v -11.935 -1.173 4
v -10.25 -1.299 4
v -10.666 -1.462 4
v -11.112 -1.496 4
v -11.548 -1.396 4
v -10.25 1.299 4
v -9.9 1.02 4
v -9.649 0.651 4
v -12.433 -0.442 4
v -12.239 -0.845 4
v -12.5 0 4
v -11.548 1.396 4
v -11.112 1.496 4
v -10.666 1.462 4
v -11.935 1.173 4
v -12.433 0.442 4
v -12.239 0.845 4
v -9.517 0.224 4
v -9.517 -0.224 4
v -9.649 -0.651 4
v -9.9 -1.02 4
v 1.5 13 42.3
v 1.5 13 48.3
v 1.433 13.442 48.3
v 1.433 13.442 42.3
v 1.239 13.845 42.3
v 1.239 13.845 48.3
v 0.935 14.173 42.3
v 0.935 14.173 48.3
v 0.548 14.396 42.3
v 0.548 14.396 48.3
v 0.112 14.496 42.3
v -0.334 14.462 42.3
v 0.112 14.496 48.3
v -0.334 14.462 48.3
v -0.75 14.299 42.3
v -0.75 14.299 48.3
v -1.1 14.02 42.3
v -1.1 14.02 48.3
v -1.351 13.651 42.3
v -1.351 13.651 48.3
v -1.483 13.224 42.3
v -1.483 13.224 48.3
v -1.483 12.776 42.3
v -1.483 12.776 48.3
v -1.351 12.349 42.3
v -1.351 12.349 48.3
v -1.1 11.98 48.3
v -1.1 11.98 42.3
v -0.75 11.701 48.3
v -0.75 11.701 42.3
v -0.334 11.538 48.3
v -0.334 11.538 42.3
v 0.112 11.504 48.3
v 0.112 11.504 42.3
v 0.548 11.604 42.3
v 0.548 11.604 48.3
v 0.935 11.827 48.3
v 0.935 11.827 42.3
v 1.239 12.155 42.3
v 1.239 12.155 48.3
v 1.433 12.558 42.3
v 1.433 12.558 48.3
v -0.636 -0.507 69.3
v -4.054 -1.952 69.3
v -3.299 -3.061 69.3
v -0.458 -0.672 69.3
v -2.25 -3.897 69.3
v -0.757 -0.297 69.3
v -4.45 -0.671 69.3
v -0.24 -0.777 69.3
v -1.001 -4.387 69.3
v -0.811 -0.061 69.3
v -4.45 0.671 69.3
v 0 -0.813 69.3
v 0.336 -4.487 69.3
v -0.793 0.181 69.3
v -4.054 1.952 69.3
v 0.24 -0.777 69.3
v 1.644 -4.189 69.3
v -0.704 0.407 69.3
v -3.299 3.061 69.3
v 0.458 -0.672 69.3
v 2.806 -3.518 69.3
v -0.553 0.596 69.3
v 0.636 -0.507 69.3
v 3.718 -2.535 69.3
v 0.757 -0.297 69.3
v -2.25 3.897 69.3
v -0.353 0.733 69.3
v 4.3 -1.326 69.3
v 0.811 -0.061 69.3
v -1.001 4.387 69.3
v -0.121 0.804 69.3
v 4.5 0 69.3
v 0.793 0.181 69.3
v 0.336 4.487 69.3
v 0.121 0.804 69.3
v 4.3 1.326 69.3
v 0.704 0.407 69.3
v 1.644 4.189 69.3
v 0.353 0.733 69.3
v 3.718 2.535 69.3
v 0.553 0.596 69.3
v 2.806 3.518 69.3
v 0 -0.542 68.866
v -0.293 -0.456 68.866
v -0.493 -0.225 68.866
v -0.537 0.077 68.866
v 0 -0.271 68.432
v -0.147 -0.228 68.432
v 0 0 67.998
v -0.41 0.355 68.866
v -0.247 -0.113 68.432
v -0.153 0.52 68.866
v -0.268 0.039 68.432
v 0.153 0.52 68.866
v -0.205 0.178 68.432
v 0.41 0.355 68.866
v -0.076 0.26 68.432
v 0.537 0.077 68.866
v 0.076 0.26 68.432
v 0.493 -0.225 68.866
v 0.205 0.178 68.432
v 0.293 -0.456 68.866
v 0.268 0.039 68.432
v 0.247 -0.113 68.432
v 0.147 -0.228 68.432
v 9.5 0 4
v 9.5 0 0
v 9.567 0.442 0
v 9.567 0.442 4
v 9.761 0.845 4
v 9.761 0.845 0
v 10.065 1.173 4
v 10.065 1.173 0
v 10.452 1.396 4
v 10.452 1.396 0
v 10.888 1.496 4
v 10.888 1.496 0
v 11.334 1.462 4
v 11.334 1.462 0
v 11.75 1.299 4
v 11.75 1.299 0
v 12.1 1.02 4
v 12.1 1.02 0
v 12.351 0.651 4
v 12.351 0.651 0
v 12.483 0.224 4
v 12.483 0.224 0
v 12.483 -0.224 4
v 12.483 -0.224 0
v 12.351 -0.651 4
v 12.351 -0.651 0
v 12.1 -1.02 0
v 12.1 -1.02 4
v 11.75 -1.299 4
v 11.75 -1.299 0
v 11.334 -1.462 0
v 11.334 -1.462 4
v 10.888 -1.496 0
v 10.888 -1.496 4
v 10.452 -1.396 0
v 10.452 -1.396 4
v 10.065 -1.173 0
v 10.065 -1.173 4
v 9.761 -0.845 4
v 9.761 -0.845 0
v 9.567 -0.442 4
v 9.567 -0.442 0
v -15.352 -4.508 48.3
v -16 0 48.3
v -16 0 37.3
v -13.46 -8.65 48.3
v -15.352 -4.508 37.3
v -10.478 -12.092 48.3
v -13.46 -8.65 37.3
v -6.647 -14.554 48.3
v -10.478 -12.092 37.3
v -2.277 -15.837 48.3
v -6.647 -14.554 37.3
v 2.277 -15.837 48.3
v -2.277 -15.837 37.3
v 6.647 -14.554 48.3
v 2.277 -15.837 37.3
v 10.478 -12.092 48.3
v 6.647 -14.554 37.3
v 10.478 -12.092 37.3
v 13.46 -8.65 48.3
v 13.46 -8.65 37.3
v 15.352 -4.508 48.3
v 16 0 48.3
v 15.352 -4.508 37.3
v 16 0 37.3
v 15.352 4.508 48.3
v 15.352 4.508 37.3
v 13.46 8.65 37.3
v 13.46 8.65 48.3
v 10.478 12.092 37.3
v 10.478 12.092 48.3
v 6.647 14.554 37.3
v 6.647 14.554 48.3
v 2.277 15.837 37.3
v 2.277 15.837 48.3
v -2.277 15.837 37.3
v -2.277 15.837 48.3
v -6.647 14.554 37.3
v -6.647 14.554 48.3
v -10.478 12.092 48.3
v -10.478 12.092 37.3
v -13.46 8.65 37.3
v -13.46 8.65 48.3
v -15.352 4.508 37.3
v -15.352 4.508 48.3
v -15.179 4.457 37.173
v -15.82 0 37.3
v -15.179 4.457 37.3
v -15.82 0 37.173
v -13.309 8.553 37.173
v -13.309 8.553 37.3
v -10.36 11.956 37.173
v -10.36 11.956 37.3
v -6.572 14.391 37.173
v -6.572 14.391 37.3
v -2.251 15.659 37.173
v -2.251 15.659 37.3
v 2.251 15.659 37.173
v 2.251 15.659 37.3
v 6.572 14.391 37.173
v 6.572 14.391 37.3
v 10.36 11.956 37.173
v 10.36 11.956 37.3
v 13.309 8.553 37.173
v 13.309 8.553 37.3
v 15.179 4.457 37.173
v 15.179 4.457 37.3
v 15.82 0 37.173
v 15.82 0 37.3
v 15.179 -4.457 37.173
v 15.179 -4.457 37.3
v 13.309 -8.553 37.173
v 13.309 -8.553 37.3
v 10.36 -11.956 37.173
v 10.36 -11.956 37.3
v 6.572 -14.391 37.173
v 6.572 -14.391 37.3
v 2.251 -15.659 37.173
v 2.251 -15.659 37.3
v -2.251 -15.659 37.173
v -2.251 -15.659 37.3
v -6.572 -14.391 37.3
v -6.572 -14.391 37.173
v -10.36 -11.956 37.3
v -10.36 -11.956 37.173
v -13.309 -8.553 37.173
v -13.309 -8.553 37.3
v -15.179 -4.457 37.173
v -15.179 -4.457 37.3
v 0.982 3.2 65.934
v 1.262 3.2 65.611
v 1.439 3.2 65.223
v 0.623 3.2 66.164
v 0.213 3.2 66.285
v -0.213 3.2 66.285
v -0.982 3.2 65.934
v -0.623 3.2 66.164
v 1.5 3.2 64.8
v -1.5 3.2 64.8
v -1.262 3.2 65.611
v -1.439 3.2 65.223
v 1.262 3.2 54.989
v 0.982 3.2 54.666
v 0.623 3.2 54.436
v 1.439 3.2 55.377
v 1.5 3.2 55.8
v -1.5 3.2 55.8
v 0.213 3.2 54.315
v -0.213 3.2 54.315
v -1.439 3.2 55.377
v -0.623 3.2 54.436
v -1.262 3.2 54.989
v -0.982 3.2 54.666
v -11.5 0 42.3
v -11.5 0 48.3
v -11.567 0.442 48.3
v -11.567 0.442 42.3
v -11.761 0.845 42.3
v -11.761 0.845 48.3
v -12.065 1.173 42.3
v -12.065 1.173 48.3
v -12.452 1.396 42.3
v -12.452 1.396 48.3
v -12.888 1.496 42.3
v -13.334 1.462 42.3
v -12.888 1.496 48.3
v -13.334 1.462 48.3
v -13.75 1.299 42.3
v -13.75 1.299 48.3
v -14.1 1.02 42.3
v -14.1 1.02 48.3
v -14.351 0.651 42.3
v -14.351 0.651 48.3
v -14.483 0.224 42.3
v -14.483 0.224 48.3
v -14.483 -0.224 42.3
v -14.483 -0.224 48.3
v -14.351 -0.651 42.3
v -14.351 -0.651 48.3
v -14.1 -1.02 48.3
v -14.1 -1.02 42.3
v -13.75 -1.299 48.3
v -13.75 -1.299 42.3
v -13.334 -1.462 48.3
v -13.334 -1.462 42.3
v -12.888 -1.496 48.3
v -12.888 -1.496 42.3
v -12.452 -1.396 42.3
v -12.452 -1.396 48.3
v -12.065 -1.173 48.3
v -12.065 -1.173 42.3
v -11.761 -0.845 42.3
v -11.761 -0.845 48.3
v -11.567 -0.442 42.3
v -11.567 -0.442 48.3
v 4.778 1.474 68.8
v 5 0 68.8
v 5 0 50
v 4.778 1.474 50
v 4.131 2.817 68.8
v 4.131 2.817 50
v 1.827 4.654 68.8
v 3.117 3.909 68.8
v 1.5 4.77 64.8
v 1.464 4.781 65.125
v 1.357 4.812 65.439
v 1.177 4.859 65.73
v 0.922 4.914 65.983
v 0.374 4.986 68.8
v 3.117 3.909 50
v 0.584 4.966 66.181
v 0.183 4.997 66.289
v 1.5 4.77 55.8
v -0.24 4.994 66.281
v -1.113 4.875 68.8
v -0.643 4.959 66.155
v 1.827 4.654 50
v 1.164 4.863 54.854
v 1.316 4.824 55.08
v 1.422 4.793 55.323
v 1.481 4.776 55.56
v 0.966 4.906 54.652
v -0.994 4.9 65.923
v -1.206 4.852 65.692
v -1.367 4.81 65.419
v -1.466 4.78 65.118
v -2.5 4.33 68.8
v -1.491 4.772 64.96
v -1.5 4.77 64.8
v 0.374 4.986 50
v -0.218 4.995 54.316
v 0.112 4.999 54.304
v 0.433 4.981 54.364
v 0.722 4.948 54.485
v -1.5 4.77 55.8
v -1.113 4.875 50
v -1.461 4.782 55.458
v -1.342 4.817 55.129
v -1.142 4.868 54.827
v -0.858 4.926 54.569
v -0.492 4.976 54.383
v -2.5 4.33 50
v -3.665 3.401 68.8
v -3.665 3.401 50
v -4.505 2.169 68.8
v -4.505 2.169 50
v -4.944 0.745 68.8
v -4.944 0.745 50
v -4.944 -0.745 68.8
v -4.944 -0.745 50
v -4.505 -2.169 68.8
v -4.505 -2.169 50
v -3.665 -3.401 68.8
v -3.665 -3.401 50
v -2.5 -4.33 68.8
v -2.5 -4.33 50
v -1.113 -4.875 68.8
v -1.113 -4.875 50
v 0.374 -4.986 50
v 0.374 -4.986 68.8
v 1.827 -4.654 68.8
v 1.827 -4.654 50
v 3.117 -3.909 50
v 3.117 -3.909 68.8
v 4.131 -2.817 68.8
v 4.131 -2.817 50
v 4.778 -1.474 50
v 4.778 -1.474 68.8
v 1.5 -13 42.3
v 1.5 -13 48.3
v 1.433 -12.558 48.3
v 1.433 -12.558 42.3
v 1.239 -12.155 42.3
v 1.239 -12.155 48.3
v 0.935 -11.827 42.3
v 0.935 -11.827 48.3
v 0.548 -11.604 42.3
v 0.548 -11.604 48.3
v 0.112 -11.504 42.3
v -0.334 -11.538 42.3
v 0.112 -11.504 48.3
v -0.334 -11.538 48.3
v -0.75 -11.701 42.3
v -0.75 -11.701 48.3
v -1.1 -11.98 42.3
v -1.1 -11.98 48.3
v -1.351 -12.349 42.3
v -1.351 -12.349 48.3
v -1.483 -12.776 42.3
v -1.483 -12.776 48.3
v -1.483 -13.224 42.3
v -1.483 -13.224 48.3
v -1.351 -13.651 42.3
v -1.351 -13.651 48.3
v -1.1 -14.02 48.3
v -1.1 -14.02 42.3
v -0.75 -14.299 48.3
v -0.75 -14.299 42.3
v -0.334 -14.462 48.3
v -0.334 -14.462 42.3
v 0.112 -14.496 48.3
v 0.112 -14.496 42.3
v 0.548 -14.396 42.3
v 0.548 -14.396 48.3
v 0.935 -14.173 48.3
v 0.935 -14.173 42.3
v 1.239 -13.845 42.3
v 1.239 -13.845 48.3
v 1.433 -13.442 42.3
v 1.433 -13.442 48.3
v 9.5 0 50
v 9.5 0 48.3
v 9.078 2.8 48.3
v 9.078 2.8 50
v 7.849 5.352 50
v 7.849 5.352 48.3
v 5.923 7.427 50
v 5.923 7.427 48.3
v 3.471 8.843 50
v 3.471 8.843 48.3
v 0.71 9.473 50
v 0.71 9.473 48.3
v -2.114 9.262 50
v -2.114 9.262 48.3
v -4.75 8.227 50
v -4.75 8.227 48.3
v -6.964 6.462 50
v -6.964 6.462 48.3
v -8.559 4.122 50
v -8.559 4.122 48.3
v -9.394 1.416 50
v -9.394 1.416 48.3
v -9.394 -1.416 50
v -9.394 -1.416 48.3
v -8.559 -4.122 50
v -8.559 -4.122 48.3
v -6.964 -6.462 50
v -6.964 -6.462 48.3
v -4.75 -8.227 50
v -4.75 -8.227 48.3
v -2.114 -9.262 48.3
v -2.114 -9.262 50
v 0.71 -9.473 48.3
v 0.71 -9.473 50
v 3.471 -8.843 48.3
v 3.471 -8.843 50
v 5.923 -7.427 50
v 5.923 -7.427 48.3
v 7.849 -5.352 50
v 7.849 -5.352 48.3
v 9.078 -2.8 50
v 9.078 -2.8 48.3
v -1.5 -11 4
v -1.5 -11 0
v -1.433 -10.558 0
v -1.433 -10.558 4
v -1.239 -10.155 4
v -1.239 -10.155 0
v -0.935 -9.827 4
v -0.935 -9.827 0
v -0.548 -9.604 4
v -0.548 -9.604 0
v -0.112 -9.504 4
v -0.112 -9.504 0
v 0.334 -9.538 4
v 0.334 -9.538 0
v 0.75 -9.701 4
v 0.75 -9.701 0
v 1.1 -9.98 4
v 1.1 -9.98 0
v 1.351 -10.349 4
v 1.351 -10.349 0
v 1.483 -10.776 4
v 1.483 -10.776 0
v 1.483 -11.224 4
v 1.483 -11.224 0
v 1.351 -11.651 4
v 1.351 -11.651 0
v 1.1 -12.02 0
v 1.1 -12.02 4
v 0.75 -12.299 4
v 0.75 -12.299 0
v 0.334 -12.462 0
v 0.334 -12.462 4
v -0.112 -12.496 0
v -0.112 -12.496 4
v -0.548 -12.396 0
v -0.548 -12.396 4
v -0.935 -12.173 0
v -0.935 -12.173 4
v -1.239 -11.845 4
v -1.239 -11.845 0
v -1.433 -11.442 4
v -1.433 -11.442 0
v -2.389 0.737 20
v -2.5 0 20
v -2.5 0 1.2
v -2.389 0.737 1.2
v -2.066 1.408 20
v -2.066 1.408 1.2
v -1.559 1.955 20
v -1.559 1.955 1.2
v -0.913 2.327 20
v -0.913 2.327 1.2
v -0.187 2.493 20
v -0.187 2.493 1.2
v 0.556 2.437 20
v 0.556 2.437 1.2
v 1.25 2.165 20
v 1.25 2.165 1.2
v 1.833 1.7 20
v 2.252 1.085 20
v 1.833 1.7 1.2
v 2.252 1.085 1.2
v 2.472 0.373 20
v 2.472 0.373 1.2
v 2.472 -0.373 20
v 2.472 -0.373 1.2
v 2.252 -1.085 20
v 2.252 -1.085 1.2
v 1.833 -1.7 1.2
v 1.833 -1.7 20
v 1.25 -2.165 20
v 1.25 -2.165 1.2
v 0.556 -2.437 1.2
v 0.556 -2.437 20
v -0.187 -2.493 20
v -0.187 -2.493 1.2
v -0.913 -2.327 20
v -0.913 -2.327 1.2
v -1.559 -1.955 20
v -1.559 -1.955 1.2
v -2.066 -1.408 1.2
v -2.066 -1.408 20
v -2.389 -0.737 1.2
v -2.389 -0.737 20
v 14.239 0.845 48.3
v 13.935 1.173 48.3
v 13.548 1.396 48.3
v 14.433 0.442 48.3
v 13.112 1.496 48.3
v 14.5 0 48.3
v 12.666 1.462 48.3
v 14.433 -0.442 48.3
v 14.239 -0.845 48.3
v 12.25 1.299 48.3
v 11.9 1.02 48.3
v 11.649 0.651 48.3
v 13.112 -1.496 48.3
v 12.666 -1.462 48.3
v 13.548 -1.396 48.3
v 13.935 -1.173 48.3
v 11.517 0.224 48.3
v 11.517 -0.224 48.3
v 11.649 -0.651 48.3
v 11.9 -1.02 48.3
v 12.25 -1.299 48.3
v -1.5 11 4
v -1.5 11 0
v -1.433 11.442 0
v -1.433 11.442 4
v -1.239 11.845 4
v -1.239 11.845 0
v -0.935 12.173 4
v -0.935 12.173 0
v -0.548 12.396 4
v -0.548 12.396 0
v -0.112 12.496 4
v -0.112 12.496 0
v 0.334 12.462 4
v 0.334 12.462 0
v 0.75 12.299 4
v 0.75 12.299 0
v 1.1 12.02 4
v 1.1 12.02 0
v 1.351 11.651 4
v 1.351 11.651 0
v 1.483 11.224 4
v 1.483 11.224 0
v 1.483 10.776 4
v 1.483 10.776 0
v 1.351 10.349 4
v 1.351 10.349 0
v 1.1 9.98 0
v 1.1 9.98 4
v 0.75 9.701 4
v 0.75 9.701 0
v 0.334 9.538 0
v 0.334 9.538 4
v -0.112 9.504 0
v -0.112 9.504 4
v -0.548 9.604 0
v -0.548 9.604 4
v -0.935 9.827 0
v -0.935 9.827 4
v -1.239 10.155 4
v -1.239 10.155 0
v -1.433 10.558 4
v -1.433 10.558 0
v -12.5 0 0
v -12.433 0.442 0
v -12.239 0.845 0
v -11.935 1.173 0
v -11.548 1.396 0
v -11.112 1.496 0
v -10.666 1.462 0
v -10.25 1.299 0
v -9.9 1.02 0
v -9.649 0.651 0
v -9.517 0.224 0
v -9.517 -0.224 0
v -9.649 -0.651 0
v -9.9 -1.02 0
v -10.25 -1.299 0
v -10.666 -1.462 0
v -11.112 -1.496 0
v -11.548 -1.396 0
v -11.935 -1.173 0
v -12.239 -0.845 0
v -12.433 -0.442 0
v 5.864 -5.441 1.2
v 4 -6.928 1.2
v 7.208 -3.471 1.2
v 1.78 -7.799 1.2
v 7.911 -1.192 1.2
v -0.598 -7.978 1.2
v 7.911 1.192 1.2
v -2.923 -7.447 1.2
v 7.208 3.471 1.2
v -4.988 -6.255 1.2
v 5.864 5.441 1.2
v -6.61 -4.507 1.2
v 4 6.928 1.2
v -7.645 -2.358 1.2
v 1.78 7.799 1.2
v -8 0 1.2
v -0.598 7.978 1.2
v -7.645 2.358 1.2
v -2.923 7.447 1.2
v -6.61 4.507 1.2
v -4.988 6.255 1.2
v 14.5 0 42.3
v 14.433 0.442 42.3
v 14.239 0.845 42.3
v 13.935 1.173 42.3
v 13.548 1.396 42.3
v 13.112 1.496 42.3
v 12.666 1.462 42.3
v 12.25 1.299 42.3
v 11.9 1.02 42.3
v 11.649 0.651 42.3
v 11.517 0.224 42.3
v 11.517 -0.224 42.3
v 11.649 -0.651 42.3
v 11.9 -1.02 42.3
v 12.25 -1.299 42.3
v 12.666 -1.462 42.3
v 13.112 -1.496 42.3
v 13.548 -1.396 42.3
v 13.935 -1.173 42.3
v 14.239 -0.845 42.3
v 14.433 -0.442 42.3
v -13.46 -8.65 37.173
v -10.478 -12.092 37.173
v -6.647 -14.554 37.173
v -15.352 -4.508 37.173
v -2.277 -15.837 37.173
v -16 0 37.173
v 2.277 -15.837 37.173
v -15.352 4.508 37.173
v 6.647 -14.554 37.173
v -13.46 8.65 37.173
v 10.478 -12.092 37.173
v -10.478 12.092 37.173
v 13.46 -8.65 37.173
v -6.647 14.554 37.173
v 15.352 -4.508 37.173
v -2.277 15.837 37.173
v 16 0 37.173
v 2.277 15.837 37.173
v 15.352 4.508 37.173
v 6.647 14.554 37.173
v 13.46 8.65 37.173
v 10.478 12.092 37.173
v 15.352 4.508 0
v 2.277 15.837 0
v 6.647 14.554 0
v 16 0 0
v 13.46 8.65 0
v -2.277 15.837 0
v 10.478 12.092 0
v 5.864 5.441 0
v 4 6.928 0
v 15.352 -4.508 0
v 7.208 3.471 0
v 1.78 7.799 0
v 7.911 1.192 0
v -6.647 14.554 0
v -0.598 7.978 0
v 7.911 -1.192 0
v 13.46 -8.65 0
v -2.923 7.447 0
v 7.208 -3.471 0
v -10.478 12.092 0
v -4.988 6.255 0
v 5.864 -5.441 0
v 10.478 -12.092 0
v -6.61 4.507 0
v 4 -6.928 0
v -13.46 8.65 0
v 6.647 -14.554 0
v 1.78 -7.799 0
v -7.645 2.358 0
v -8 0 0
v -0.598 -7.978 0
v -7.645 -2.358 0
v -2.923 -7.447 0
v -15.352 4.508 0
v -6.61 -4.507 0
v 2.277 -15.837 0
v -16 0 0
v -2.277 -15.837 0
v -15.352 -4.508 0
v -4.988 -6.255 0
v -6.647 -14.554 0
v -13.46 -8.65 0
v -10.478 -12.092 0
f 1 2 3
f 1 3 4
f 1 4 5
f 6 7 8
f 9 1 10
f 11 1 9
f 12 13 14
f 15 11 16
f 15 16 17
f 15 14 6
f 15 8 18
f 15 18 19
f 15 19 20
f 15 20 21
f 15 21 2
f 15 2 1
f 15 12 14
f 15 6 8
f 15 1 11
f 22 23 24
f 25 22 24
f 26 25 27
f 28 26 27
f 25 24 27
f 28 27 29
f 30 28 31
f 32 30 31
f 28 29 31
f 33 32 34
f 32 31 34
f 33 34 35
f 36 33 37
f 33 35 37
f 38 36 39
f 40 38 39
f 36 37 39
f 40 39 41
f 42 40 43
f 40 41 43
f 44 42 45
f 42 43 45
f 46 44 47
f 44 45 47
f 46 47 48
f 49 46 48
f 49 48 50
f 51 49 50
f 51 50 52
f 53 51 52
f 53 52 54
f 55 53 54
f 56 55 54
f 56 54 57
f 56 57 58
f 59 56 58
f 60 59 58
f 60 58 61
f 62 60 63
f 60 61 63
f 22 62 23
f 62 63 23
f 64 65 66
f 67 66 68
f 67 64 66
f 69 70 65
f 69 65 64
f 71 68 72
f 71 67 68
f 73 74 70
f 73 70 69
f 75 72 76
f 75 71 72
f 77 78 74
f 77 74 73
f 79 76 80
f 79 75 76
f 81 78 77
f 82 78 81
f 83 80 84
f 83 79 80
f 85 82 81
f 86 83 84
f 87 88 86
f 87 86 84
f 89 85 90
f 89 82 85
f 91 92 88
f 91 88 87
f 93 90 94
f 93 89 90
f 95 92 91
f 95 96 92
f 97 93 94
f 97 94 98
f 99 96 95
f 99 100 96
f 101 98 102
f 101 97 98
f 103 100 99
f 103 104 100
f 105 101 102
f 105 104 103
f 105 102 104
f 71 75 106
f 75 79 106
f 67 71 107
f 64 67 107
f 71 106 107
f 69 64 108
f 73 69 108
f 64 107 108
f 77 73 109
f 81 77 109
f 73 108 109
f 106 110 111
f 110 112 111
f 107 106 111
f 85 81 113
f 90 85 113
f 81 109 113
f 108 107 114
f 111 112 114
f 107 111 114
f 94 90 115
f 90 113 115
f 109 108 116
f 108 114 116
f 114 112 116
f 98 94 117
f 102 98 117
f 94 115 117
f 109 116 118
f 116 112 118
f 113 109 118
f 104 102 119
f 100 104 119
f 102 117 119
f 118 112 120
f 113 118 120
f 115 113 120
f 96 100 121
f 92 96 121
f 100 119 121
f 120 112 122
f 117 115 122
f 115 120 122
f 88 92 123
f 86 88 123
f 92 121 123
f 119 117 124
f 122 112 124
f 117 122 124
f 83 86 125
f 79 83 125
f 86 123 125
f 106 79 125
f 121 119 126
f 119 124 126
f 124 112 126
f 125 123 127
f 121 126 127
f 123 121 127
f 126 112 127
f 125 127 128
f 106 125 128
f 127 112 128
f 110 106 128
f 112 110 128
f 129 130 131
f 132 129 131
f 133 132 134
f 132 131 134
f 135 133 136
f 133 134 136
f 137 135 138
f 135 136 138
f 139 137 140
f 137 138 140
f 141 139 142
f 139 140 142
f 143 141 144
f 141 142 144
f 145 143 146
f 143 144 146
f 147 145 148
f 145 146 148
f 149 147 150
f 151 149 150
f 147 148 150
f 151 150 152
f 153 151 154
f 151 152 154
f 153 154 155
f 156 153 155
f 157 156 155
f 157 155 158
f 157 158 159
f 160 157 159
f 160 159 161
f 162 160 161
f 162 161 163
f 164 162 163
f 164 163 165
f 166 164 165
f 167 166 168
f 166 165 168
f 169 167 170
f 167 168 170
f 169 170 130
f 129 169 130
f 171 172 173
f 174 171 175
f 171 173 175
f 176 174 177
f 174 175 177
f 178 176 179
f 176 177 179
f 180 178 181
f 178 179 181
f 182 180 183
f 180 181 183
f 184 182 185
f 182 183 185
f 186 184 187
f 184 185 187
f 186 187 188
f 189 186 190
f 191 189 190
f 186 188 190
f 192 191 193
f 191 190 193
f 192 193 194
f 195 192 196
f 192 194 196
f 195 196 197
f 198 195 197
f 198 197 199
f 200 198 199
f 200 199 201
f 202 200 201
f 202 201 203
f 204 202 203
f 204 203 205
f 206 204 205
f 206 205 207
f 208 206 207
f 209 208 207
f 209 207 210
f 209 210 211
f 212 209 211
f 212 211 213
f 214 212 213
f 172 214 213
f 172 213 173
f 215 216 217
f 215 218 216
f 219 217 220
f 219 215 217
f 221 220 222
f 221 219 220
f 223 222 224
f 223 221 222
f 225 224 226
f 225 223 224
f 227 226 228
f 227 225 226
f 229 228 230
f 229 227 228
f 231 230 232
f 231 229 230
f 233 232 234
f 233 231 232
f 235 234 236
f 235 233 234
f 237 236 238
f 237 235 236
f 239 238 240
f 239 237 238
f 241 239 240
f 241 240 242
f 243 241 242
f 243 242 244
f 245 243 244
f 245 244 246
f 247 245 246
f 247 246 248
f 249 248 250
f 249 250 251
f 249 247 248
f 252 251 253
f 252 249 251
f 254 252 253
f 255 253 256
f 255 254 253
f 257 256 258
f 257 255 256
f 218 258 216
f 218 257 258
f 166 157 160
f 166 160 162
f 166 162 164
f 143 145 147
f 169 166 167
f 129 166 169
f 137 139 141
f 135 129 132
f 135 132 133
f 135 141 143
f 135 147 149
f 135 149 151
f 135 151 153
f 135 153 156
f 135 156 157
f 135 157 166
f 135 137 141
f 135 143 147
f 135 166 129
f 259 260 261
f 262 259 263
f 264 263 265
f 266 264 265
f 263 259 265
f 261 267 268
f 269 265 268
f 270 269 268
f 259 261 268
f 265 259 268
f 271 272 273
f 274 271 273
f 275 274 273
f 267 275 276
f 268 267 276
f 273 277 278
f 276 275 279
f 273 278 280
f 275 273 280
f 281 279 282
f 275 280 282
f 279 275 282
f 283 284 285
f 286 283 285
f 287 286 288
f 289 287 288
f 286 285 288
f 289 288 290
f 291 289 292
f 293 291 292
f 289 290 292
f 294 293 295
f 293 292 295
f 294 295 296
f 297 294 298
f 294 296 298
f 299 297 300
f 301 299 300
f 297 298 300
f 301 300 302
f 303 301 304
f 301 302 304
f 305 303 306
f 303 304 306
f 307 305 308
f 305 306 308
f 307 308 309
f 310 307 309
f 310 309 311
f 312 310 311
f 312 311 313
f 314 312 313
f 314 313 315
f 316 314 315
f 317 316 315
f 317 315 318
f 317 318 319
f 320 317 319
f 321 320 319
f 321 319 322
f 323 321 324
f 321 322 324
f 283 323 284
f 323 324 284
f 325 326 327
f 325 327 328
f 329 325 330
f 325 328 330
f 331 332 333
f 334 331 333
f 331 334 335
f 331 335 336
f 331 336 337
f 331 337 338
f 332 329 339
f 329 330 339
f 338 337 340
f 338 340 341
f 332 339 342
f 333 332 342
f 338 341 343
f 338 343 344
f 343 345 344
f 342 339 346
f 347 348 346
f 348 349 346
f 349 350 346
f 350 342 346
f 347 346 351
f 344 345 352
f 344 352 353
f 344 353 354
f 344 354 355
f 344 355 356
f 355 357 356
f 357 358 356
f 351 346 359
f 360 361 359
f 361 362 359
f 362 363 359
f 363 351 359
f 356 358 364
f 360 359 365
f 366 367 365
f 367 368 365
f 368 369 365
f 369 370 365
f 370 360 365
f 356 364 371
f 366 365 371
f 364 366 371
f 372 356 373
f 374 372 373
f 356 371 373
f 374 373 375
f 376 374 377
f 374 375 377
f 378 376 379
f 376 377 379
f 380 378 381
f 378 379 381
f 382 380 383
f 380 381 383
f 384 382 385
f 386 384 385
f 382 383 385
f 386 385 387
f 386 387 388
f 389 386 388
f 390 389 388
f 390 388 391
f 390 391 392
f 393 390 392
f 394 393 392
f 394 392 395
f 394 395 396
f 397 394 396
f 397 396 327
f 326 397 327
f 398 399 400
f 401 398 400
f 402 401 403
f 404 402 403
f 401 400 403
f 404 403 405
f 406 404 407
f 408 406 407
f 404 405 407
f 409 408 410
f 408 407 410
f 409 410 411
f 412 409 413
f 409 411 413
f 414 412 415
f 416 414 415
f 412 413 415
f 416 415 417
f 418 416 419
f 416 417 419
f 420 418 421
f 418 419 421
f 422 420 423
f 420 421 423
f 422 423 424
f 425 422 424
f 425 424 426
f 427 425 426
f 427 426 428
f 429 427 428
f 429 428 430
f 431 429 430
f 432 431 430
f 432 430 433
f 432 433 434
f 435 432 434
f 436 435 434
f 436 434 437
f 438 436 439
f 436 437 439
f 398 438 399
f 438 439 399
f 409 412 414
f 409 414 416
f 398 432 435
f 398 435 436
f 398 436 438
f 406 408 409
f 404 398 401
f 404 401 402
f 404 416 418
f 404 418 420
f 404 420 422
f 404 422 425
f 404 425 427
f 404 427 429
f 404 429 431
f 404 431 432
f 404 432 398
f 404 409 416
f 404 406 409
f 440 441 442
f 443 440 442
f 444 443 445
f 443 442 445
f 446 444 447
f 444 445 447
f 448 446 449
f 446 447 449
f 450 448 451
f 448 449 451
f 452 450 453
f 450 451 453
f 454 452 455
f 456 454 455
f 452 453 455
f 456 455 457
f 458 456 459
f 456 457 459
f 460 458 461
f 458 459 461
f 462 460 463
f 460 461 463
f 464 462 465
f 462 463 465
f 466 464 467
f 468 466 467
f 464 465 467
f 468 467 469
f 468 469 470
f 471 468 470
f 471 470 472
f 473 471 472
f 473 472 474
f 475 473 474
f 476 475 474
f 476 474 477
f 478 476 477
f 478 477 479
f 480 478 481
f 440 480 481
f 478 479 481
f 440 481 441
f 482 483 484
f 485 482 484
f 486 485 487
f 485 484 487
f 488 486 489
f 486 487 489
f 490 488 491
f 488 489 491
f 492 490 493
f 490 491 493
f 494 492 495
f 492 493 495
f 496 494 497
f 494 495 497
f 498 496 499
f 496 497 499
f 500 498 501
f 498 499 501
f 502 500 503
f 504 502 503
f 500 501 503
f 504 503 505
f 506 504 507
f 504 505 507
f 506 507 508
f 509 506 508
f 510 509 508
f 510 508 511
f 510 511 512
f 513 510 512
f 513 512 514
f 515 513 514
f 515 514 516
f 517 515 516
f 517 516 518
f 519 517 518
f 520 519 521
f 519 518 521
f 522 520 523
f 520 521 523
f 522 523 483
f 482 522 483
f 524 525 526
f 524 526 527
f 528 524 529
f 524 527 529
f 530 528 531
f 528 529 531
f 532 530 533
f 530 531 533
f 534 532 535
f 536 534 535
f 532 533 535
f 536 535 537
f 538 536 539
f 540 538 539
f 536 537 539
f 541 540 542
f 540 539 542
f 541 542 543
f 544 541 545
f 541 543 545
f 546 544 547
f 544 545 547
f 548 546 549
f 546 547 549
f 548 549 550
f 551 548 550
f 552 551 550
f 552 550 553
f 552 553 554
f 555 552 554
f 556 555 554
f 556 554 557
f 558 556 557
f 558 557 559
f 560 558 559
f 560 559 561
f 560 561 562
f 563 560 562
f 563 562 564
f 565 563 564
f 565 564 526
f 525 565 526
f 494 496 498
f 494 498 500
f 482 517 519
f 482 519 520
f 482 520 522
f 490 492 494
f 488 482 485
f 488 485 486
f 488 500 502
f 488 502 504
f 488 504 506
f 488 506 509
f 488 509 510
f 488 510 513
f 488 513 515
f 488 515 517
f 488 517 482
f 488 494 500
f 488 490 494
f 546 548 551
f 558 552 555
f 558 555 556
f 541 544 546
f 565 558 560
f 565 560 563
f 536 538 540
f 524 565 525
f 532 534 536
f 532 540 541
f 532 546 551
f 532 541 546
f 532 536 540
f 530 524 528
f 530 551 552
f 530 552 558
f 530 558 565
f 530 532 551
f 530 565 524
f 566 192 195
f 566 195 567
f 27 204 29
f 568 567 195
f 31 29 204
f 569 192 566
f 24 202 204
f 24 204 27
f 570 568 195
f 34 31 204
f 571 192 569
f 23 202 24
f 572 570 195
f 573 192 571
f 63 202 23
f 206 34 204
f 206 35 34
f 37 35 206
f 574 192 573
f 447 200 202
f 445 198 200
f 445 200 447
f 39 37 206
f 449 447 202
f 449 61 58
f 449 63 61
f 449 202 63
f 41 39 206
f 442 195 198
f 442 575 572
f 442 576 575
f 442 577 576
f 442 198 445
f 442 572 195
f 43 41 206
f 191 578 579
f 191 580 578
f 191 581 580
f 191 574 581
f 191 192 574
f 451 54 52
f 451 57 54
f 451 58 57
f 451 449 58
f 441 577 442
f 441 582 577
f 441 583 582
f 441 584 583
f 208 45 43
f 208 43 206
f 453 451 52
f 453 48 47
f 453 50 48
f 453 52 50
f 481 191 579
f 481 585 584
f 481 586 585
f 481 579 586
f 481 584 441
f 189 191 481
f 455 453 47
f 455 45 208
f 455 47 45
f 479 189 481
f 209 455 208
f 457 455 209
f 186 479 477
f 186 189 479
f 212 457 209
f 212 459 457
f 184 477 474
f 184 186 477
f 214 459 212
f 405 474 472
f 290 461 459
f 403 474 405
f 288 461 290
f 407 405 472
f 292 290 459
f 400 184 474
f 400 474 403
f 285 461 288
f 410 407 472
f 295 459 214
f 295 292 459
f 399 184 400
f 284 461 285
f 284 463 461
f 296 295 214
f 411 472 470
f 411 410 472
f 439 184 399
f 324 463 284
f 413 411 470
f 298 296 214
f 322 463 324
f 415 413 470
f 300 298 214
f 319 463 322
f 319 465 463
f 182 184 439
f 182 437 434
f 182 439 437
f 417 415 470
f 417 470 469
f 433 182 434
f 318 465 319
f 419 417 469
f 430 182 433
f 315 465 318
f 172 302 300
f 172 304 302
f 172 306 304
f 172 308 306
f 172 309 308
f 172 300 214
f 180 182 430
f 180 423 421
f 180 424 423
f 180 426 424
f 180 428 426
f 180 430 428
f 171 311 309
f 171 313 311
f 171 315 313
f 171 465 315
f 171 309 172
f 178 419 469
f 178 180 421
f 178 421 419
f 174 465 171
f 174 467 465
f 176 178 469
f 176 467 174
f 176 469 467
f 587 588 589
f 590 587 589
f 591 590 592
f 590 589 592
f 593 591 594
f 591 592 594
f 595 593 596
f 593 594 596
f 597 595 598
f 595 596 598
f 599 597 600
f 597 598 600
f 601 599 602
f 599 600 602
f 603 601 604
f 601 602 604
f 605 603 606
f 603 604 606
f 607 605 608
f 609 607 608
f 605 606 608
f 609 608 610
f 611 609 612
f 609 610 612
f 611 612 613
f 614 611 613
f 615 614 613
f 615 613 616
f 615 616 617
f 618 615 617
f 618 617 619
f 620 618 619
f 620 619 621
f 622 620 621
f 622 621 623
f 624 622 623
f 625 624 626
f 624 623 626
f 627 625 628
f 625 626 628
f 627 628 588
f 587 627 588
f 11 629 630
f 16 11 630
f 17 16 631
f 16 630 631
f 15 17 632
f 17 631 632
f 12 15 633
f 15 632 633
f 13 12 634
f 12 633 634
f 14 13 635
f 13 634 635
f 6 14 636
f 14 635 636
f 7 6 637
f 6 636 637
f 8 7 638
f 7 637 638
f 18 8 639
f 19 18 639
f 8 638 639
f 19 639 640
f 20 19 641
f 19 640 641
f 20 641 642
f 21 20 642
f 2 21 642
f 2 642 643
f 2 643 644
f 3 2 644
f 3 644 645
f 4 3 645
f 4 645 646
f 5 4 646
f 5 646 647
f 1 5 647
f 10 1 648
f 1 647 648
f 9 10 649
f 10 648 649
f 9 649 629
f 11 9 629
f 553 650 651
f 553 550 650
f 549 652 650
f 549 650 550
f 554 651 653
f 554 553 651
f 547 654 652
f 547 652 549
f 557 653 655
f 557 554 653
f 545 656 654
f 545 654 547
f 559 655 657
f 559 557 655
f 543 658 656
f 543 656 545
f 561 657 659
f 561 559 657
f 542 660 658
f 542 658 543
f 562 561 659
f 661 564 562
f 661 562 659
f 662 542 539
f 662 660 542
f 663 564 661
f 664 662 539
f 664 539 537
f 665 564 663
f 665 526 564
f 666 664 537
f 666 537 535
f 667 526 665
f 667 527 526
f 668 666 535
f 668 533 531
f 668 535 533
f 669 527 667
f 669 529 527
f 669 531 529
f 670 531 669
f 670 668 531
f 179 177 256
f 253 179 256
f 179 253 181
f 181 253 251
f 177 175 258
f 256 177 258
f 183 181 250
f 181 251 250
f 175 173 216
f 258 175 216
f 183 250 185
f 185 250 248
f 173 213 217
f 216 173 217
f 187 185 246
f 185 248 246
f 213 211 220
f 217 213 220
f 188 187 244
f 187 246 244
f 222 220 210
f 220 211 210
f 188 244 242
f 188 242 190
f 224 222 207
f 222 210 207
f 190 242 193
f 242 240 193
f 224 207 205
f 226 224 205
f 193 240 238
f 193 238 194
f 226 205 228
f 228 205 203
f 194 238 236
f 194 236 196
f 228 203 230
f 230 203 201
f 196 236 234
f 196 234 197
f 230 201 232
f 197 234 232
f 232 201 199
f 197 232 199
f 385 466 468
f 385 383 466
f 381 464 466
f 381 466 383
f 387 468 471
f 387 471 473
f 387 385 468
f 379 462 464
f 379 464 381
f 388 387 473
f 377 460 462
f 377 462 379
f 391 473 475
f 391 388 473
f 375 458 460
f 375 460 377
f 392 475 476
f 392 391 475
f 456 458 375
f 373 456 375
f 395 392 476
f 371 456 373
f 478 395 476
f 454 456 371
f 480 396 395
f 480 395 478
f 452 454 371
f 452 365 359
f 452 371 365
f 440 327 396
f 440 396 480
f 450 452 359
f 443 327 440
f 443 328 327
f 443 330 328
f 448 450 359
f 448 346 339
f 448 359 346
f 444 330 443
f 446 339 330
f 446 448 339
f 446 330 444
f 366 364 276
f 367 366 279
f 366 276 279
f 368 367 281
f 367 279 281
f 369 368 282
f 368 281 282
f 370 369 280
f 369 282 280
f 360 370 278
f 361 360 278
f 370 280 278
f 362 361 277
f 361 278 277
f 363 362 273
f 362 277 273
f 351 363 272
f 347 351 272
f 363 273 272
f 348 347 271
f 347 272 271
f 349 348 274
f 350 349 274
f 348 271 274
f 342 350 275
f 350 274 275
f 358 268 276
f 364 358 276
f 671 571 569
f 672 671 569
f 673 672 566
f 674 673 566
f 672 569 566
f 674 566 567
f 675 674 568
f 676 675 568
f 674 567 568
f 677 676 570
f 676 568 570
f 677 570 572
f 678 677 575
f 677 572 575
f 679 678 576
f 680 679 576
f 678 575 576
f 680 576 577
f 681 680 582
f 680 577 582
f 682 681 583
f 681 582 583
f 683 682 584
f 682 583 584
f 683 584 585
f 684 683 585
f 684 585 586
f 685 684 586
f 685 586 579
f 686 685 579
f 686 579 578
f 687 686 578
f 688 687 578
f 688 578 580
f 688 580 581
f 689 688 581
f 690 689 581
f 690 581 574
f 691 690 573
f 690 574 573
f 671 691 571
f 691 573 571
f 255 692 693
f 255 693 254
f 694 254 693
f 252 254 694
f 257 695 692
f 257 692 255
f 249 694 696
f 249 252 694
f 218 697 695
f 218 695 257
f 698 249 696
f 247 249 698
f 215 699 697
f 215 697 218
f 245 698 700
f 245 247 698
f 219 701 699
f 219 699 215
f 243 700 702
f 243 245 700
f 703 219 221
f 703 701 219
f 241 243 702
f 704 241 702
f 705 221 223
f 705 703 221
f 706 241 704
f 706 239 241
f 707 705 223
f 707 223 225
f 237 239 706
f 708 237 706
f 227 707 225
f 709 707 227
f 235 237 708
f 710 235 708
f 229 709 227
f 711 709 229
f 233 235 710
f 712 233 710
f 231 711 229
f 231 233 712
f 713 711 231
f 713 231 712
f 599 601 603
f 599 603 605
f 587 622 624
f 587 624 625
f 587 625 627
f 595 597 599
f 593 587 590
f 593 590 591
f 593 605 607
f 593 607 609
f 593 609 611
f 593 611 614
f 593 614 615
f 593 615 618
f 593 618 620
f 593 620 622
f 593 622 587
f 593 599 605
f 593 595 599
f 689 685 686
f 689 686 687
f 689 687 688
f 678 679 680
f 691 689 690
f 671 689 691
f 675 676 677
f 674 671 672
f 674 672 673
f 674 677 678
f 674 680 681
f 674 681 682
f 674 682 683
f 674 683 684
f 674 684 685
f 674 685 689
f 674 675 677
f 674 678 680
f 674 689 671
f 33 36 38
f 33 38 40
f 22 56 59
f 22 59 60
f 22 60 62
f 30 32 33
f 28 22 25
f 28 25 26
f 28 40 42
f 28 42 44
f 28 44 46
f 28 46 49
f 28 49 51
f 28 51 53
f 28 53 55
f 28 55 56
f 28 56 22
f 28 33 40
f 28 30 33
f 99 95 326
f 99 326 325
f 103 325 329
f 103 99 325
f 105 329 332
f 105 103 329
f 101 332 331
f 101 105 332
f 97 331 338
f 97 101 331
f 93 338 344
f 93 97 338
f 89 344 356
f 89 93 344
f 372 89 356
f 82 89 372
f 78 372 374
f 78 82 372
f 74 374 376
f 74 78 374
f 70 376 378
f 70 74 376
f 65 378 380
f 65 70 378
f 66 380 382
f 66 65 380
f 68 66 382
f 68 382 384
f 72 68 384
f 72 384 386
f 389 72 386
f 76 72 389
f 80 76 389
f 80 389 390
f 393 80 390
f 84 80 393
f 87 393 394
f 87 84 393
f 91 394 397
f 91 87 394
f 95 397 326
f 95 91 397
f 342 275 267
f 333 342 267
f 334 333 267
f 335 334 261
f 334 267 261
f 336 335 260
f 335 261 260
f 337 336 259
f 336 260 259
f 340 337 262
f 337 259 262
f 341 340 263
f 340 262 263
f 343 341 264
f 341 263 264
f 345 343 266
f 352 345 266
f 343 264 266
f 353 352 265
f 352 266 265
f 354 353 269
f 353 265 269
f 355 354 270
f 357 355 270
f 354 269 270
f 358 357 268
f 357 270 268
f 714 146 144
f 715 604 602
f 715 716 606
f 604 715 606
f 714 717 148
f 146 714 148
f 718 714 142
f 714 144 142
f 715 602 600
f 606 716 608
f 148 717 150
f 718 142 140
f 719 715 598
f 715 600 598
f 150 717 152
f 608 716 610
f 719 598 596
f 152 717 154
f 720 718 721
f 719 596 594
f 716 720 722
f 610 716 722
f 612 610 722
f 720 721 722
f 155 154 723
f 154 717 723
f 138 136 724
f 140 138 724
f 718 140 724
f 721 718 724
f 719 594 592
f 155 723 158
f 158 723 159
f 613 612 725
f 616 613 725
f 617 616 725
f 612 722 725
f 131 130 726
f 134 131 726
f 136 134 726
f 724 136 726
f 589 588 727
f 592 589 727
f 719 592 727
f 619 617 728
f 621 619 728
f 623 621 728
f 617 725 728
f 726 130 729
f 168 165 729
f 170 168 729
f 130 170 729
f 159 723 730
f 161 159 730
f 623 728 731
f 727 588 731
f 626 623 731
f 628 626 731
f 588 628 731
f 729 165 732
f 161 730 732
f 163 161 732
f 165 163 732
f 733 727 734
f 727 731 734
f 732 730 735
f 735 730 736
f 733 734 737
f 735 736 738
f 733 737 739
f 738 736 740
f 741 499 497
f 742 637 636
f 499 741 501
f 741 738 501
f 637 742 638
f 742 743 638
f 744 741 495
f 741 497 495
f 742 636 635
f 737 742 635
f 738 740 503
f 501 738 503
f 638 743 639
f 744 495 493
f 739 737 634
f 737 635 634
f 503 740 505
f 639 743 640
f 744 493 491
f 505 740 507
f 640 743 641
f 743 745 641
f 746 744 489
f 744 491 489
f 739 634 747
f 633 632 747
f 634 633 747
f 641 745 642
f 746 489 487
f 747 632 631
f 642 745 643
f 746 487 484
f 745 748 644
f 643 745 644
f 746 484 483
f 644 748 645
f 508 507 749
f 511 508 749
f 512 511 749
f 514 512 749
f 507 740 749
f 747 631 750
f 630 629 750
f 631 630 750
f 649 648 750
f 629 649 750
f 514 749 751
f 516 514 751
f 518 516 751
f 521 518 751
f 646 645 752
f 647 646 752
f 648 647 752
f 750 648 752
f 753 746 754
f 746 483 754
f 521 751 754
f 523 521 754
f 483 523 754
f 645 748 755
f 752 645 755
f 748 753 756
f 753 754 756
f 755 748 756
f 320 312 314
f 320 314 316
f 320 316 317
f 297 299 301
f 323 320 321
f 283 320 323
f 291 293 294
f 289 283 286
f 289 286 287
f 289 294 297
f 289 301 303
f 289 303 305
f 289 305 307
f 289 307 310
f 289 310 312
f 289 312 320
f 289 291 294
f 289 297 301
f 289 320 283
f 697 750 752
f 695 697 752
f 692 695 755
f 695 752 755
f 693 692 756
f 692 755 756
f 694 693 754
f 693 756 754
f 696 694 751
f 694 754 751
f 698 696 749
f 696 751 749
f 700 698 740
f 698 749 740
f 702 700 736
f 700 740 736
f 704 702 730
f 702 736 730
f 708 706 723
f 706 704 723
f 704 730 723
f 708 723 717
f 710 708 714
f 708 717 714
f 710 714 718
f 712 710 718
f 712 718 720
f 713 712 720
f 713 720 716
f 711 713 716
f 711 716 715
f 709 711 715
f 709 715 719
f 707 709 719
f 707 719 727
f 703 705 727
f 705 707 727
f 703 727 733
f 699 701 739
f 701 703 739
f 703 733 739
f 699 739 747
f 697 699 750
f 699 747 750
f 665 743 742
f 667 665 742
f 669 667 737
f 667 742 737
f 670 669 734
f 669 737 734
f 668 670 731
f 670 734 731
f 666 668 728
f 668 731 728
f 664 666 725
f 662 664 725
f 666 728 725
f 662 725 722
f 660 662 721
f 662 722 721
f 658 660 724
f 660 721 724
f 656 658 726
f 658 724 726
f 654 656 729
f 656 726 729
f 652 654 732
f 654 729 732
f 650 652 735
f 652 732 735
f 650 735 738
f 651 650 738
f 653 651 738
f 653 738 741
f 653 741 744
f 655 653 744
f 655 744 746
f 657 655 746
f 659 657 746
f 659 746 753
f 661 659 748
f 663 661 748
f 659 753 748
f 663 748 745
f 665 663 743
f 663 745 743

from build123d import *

# Parameters (mm, degrees)
SKETCH_8_R           = 16
EXTRUDE_1_DEPTH      = 48.3
SKETCH_9_R           = 9.5
EXTRUDE_2_DEPTH      = 1.7
SKETCH_10_R          = 5
EXTRUDE_3_DEPTH      = 19.3
CUT_EXTRUDE_8_DEPTH  = 3
SKETCH_13_R          = 1.5
CUT_EXTRUDE_9_DEPTH  = 6
SKETCH_14_R          = 8
CUT_EXTRUDE_10_DEPTH = 1.2
SKETCH_15_R          = 2.5
CUT_EXTRUDE_11_DEPTH = 20
SKETCH_16_R          = 1.5
CUT_EXTRUDE_12_DEPTH = 4
SKETCH_17_W          = 1.387391921
SKETCH_17_H          = 0.126778365
CHAMFER_1_SIZE       = 0.5


with BuildPart() as part:
    # 草图8 → 凸台-拉伸1 (new body)
    with BuildSketch(Plane.XY):
        with Locations(Location((0, 0, 0), (0, 0, 180))):
            Circle(SKETCH_8_R)
    extrude(amount=EXTRUDE_1_DEPTH)

    # 草图9 → 凸台-拉伸2 (add)
    with BuildSketch(Plane.XY.offset(48.3)):
        Circle(SKETCH_9_R)
    extrude(amount=EXTRUDE_2_DEPTH)

    # 草图10 → 凸台-拉伸3 (add)
    with BuildSketch(Plane.XY.offset(50)):
        Circle(SKETCH_10_R)
    extrude(amount=EXTRUDE_3_DEPTH)

    # 切除-拉伸7 cone 1 section (through the dimple's axis) → 切除-拉伸7 (revolve, cut)
    with BuildSketch(Plane(origin=(0, 0, 69.3), x_dir=(0, -1, 0), z_dir=(1, 0, 0))):
        Polygon((0, 0), (0.813334859, 0), (0, 1.301607858), align=None)
    revolve(axis=Axis((0, 0, 69.3), (0, 0, -1)), mode=Mode.SUBTRACT)

    # 草图12 → 切除-拉伸8 (cut)
    with BuildSketch(Plane(origin=(0, 3.2, 0), x_dir=(1, 0, 0), z_dir=(0, 1, 0))):
        with BuildLine():
            Line((-1.5, -64.8), (-1.5, -55.8))
            ThreePointArc((-1.5, -55.8), (0, -54.3), (1.5, -55.8))
            Line((1.5, -55.8), (1.5, -64.8))
            ThreePointArc((1.5, -64.8), (0, -66.3), (-1.5, -64.8))
        make_face()
    extrude(amount=CUT_EXTRUDE_8_DEPTH, mode=Mode.SUBTRACT)

    # 草图13 → 切除-拉伸9 (cut)
    with BuildSketch(Plane.XY.offset(48.3)):
        with Locations((0, 13)):
            Circle(SKETCH_13_R)
        with Locations((-13, 0)):
            Circle(SKETCH_13_R)
        with Locations((0, -13)):
            Circle(SKETCH_13_R)
        with Locations((13, 0)):
            Circle(SKETCH_13_R)
    extrude(amount=-CUT_EXTRUDE_9_DEPTH, mode=Mode.SUBTRACT)

    # 草图14 → 切除-拉伸10 (cut)
    with BuildSketch(Plane(origin=(0, 0, 0), x_dir=(-1, 0, 0), z_dir=(0, 0, -1))):
        Circle(SKETCH_14_R)
    extrude(amount=-CUT_EXTRUDE_10_DEPTH, mode=Mode.SUBTRACT)

    # 草图15 → 切除-拉伸11 (cut)
    with BuildSketch(Plane(origin=(0, 0, 0), x_dir=(-1, 0, 0), z_dir=(0, 0, -1))):
        Circle(SKETCH_15_R)
    extrude(amount=-CUT_EXTRUDE_11_DEPTH, mode=Mode.SUBTRACT)

    # 草图16 → 切除-拉伸12 (cut)
    with BuildSketch(Plane(origin=(0, 0, 0), x_dir=(-1, 0, 0), z_dir=(0, 0, -1))):
        with Locations((0, 11)):
            Circle(SKETCH_16_R)
        with Locations((11, 0)):
            Circle(SKETCH_16_R)
        with Locations((0, -11)):
            Circle(SKETCH_16_R)
        with Locations((-11, 0)):
            Circle(SKETCH_16_R)
    extrude(amount=-CUT_EXTRUDE_12_DEPTH, mode=Mode.SUBTRACT)

    # 草图17 → 切除-旋转1 (revolve, cut)
    with BuildSketch(Plane(origin=(0, 0, 0), x_dir=(1, 0, 0), z_dir=(0, 1, 0)), mode=Mode.PRIVATE) as cut_revolve_1_sk:
        with Locations((16.513931417, -37.236610818)):
            Rectangle(SKETCH_17_W, SKETCH_17_H)
    revolve(cut_revolve_1_sk.sketch.rotate(Axis((0, 0, 69.3), (0, 0, -1)), 180), axis=Axis((0, 0, 69.3), (0, 0, -1)), mode=Mode.SUBTRACT)

    # 倒角1
    chamfer_1_edges = [part.edges().sort_by_distance(p)[0] for p in [
        (-5, 0, 69.3),
    ]]
    chamfer(chamfer_1_edges, length=CHAMFER_1_SIZE)


solid = part.part
